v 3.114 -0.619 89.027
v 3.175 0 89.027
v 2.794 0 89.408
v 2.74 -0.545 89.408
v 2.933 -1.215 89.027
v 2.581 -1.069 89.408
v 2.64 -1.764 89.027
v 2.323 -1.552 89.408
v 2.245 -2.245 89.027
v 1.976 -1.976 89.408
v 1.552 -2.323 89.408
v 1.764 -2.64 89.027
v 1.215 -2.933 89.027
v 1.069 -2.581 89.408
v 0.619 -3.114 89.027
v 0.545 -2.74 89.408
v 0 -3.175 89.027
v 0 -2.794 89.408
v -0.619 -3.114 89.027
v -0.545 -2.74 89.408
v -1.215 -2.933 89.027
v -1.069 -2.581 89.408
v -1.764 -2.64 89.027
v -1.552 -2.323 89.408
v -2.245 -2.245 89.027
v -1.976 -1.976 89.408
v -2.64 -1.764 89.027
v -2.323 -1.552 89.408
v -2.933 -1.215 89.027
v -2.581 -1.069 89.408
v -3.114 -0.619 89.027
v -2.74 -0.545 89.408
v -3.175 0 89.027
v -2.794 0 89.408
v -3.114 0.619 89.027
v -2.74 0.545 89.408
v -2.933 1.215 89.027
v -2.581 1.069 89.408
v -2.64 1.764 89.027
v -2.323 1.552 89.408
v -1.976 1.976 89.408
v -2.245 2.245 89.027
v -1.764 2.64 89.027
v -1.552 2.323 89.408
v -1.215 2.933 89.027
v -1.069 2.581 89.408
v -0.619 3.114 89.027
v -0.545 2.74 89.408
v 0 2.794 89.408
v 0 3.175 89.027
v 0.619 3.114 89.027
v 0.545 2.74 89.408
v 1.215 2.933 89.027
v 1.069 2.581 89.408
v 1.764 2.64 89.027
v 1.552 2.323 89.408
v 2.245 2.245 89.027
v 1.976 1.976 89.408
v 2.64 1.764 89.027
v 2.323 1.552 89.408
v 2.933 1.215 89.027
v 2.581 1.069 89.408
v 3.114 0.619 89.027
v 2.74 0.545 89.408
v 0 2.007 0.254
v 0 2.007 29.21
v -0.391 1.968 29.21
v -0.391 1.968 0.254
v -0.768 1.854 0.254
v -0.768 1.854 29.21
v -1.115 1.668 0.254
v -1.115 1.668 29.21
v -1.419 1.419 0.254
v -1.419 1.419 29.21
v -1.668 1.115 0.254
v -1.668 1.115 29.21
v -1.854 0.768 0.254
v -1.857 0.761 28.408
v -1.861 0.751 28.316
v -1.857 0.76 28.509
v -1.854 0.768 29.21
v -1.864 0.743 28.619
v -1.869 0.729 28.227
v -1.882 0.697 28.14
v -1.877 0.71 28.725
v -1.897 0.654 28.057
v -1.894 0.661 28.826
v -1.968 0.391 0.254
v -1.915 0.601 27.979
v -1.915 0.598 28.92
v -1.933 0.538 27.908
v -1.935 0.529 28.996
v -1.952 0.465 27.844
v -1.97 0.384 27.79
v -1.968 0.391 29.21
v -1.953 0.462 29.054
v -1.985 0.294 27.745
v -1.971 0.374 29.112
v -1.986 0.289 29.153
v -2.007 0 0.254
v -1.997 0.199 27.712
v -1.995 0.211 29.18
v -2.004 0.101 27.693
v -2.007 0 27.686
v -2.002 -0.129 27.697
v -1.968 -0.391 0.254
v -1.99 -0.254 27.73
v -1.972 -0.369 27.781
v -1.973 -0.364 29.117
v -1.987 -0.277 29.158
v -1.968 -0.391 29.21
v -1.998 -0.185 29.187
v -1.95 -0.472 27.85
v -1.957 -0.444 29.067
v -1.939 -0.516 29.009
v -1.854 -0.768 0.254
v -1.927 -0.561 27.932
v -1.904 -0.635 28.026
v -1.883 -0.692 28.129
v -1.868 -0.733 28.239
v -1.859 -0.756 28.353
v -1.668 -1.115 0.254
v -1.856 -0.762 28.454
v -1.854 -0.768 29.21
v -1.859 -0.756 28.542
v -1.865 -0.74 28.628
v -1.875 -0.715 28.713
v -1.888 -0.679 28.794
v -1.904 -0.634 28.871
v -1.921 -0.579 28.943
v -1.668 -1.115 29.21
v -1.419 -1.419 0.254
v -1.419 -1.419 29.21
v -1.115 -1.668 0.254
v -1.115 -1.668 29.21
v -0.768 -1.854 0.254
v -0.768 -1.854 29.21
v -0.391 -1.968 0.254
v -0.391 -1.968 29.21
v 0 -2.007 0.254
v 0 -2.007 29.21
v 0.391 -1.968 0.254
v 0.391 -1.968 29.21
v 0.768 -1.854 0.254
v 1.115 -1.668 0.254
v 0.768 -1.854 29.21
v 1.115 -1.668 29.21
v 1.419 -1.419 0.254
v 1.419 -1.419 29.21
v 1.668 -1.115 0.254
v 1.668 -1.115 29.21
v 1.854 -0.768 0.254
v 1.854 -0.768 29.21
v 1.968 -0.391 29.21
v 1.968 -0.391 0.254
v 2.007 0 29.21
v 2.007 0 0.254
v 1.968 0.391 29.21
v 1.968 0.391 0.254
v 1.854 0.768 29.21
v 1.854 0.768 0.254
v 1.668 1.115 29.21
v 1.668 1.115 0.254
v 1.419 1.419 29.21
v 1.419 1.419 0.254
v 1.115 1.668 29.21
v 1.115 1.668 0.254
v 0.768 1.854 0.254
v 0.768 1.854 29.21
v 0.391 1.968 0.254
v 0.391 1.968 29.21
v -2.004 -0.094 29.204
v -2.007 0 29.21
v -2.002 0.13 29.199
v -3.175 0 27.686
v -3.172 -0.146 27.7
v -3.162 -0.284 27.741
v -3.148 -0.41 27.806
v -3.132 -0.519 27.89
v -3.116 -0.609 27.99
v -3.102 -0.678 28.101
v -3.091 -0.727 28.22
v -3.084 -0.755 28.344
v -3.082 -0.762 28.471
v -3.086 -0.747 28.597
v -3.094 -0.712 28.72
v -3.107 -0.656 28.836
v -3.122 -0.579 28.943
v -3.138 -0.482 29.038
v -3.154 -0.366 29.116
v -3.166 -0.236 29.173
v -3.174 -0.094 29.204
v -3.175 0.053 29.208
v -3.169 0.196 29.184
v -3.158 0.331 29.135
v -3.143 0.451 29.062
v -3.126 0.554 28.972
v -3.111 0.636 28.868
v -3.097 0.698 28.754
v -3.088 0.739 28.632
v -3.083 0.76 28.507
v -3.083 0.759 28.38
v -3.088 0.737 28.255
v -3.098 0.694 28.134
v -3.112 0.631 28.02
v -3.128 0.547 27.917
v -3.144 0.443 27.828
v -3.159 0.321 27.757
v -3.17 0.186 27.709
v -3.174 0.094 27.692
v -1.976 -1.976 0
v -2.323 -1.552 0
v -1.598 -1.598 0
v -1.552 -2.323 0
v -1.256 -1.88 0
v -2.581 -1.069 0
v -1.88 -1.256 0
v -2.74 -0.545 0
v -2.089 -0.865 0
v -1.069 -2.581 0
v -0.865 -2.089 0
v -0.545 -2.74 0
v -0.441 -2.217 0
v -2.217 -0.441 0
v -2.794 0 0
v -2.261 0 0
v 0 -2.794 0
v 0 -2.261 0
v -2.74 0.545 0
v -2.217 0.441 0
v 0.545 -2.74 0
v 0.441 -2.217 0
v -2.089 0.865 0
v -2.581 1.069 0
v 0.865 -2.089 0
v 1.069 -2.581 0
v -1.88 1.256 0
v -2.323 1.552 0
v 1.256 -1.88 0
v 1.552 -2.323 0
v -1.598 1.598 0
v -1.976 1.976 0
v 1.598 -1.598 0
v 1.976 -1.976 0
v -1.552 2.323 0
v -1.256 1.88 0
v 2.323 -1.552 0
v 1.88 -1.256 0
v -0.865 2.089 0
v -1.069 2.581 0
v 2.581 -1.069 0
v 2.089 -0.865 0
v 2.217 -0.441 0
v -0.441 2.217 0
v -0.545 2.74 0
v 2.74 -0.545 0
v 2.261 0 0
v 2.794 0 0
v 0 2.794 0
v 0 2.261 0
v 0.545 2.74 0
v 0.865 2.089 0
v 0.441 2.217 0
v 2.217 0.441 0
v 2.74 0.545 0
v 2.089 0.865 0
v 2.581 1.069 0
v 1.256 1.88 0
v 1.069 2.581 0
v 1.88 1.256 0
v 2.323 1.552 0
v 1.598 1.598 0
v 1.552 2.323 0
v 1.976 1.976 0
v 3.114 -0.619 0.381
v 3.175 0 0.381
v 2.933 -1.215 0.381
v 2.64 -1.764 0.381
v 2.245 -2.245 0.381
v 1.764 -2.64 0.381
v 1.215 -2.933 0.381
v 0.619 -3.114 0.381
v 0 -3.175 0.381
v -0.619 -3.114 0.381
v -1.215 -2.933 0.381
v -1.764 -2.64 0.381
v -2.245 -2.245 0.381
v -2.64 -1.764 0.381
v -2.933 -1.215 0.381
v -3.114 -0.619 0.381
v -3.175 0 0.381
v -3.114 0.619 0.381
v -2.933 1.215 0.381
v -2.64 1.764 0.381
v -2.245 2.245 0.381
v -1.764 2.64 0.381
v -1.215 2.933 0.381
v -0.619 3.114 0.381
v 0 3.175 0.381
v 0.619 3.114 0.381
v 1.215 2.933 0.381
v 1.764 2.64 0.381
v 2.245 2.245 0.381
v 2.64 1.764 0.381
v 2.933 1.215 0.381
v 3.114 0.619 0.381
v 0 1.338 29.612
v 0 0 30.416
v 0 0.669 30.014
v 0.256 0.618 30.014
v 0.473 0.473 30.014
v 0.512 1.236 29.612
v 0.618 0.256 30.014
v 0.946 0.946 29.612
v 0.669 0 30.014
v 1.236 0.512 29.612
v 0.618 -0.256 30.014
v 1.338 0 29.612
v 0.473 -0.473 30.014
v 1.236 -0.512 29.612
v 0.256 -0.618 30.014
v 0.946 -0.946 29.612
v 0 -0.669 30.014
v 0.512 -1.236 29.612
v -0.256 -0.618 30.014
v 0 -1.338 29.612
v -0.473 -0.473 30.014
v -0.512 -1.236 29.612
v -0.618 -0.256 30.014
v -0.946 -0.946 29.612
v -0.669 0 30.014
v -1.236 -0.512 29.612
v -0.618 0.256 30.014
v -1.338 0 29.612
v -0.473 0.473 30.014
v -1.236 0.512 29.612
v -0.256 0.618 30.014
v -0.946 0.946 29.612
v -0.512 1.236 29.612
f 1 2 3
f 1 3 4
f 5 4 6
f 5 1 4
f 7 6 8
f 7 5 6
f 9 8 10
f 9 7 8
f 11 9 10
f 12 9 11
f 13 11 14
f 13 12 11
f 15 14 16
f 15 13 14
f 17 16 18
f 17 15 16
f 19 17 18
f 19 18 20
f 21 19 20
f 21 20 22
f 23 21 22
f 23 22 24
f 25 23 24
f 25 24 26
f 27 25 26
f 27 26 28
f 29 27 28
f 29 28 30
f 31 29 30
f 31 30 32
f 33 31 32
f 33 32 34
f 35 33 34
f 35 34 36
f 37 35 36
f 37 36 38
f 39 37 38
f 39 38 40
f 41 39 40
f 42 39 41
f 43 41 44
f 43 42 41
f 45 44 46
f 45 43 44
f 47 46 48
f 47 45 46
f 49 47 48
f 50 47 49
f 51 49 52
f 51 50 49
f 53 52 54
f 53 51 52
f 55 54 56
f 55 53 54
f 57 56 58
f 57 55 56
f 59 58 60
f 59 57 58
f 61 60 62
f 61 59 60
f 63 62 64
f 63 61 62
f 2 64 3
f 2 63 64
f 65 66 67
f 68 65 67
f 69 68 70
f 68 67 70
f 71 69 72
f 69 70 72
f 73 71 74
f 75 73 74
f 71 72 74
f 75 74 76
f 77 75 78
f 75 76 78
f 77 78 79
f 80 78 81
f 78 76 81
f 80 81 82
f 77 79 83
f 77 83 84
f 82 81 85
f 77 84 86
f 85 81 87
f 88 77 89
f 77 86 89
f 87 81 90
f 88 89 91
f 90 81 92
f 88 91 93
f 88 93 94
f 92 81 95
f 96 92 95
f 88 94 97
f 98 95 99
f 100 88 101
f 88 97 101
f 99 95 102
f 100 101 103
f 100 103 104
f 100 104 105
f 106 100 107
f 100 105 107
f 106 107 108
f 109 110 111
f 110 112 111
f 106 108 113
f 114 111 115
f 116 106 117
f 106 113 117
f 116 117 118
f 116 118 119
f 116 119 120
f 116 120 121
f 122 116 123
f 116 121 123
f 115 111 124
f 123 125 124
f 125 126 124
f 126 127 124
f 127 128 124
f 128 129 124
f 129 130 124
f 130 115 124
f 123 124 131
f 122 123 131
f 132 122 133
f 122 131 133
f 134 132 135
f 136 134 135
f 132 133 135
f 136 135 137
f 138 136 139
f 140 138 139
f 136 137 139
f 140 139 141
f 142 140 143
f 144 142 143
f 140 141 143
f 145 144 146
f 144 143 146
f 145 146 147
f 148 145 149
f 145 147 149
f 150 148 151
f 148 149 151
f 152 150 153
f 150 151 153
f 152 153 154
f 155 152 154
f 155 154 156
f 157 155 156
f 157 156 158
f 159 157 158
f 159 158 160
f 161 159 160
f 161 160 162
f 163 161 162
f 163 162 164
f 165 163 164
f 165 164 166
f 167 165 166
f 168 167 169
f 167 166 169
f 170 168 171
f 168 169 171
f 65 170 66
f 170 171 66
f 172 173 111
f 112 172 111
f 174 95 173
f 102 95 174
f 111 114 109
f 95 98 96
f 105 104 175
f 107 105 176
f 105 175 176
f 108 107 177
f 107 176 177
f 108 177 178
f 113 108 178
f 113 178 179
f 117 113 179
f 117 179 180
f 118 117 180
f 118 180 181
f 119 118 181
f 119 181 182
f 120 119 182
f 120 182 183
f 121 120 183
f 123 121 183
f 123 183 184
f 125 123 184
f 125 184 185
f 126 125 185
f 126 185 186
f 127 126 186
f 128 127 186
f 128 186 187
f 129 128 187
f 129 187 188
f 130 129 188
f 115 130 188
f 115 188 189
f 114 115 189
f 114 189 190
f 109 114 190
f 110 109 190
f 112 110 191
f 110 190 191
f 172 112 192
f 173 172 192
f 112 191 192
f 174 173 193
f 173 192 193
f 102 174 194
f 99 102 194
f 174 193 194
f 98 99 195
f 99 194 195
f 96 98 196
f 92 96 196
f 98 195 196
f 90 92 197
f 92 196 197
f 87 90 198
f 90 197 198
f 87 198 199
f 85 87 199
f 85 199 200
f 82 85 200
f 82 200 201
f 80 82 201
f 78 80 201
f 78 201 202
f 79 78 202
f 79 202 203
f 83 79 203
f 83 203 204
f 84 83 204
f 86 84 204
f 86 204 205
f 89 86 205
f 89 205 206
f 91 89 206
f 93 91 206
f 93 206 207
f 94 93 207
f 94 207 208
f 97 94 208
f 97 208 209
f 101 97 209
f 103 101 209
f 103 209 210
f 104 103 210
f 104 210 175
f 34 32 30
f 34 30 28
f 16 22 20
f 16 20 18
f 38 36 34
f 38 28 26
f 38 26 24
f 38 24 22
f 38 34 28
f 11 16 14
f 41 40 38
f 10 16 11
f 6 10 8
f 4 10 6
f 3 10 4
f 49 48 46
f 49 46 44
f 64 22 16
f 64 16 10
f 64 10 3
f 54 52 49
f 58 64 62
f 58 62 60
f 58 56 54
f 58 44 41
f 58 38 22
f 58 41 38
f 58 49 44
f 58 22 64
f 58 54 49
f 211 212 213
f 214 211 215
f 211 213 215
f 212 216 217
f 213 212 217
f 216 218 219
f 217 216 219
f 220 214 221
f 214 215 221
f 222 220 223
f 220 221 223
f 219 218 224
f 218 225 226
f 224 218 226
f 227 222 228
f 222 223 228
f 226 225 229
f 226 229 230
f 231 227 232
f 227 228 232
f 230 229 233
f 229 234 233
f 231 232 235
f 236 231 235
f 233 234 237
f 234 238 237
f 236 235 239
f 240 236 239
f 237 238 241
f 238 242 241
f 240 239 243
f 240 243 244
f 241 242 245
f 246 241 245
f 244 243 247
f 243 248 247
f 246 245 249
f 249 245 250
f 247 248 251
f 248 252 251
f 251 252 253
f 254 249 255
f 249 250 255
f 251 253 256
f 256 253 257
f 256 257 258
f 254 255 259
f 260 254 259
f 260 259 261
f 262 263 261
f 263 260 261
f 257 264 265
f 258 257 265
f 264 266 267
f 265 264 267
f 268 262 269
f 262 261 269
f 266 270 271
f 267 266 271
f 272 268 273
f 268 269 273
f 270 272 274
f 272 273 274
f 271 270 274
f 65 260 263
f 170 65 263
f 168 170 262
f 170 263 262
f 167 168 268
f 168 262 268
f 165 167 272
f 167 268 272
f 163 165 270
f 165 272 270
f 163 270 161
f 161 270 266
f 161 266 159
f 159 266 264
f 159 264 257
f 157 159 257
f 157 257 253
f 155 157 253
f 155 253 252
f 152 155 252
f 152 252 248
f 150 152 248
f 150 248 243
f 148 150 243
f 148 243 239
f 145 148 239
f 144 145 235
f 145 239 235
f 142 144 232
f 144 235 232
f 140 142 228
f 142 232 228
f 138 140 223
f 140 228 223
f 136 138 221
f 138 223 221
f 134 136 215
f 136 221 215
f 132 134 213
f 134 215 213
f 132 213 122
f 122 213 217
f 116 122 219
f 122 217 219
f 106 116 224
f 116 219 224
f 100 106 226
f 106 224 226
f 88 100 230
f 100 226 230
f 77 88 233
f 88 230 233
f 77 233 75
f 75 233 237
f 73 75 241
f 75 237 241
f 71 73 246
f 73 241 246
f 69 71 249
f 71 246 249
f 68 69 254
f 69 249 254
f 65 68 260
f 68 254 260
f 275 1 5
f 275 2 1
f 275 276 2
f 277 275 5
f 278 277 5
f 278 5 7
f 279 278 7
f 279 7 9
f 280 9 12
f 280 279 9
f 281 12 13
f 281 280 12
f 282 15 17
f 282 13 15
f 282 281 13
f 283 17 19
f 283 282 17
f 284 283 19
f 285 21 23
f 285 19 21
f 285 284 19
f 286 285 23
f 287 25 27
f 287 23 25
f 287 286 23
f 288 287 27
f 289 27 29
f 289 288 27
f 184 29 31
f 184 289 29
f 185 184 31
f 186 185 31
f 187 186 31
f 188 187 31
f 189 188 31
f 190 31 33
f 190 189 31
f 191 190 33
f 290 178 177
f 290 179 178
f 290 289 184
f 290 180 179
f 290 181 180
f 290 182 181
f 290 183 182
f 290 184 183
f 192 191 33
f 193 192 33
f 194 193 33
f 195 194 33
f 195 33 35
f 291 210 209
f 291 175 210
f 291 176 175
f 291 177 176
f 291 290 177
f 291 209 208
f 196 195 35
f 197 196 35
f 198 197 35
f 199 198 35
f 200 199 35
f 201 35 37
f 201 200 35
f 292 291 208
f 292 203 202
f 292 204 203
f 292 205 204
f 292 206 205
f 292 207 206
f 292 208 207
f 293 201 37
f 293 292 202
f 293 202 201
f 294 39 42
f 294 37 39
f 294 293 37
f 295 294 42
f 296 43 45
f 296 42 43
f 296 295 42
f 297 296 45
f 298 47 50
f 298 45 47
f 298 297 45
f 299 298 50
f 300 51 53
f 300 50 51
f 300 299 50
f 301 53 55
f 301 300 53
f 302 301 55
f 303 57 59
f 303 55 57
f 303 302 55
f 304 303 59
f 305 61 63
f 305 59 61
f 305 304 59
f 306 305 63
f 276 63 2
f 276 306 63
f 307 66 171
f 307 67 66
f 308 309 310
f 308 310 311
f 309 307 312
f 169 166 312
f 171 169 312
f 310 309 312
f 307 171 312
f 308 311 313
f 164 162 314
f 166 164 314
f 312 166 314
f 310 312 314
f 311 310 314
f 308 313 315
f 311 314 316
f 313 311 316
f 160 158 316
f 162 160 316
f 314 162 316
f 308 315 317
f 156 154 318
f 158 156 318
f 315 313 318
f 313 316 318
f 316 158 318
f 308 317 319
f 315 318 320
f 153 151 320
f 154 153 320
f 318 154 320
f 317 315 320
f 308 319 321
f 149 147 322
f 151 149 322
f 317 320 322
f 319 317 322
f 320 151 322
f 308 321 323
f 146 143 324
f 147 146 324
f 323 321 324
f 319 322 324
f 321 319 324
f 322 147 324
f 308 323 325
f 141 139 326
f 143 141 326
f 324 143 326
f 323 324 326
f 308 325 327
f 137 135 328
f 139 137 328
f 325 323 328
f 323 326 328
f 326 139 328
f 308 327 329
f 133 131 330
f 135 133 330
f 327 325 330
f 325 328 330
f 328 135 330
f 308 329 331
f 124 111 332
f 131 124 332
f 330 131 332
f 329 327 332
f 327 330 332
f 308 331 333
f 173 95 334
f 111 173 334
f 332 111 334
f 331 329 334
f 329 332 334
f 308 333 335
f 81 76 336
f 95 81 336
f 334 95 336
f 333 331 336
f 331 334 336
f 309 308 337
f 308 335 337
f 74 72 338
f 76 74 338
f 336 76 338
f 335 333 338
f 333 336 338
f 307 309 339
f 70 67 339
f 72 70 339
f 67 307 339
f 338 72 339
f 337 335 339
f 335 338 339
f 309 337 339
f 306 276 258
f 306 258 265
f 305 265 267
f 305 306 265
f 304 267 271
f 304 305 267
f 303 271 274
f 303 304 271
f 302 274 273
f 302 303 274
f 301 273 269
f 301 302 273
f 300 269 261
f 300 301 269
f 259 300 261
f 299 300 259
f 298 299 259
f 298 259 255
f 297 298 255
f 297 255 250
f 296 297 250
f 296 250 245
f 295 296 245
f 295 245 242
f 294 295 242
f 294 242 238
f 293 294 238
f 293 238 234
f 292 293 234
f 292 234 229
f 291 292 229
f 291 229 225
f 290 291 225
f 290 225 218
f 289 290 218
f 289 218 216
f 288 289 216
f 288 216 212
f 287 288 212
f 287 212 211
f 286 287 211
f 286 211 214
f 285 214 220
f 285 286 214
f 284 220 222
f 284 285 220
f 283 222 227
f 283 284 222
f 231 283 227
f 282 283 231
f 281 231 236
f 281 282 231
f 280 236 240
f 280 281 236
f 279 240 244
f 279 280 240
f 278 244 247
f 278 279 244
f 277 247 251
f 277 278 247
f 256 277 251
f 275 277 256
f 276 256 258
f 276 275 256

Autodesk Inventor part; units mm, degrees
ref_plane "YZ Plane" through (0, 0, 0) normal (1, 0, 0) x (0, 1, 0)
ref_plane "XZ Plane" through (0, 0, 0) normal (0, 1, 0) x (-1, 0, 0)
ref_plane "XY Plane" through (0, 0, 0) normal (0, 0, 1) x (1, 0, 0)
sketch "Sketch1" plane through (0, 0, 0) normal (0, 0, 1) x (1, 0, 0)
  circle A0 centre (0, 0) radius 3.175
  dimension "d0" = 6.35
extrude "Extrusion1" add sketch "Sketch1" along normal blind 89.408
hole "Hole2" at (0, 0, 0) direction (0, 0, 1) diameter 4.0132 depth 29.21 tip angle 118 countersink diameter 4.5212 countersink angle 90
chamfer "Chamfer3" distance 0.381 angle 45 2 edges at (-3.175, 0, 89.408) (-3.175, 0, 0)
sketch "Sketch11" plane through (0, 0, 0) normal (1, 0, 0) x (0, 1, 0)
  line L0 (-2.0066, 29.21) -> (2.0066, 29.21) projected
  line L1 (0, 107.2896) -> (0, -17.8816) projected
  circle A0 centre (0, 28.448) radius 0.762 construction
  point P0 (0, 0)
  dimension "d65" = 1.524
hole "Hole3" at (0, 0, 28.448) direction (-1, 0, 0) diameter 1.524 depth 3.81 tip angle 118
properties part number "J008574 NEUROPIXELS GEN 2 ROD ADAPTER Rev -" material "ALUMINUM, 6061-T651"
